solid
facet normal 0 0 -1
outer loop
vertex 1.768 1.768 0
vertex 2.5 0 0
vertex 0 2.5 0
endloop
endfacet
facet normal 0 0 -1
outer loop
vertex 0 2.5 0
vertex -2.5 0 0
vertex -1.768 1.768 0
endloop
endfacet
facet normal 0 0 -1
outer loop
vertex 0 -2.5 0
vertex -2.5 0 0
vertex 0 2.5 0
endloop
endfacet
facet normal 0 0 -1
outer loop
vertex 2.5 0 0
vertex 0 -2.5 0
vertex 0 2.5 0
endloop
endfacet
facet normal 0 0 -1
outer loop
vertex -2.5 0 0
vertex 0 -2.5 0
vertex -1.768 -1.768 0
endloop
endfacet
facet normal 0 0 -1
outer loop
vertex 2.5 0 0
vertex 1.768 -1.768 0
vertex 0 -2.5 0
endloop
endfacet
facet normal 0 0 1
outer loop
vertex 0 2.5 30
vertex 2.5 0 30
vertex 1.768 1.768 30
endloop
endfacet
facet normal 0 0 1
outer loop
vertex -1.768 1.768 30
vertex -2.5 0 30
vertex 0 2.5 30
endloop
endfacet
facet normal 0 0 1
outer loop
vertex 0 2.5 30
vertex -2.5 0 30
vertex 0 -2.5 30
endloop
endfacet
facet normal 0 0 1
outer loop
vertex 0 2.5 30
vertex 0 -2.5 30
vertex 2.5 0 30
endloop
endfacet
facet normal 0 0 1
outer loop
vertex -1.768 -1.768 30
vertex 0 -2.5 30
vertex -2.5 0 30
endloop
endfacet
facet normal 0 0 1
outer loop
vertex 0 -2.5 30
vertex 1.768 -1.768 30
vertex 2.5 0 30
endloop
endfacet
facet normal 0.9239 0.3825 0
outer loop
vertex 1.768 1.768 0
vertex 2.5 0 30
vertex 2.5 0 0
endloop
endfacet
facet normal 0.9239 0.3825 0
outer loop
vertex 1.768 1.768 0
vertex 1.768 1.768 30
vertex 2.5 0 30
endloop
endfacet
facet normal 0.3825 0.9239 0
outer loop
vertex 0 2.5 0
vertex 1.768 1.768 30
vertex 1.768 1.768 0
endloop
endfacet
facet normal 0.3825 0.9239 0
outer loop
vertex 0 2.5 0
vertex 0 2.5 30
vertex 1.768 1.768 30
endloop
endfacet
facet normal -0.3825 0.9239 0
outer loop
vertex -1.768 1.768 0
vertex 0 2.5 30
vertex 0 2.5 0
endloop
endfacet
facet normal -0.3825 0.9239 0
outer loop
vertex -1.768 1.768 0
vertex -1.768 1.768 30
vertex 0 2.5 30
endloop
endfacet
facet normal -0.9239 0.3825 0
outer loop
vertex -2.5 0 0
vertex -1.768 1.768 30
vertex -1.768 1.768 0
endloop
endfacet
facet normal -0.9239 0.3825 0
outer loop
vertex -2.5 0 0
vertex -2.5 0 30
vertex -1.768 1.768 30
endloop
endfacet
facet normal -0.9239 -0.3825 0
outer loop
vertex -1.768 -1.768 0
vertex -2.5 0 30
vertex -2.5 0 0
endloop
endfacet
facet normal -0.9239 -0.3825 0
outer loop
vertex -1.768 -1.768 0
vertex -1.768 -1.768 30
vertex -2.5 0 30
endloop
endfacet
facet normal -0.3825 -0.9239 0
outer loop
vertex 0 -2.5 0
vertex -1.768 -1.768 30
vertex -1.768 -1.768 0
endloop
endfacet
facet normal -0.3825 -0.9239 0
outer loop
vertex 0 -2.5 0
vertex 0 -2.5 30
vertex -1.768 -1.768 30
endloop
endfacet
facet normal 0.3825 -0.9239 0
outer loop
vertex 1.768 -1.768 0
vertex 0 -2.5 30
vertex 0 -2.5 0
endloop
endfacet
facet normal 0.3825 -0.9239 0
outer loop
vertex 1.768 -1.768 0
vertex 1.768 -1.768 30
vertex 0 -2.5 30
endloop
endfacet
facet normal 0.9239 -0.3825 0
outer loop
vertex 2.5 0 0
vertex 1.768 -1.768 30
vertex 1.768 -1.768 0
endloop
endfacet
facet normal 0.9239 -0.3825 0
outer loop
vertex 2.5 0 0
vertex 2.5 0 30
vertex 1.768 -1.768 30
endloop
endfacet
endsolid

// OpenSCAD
//$fn=60;
//cylinder(h=35,d=3);  
linear_extrude(height = 30)
circle ( d = 5);
//translate([10,0,0])
//cylinder(h=35,d=3);  
